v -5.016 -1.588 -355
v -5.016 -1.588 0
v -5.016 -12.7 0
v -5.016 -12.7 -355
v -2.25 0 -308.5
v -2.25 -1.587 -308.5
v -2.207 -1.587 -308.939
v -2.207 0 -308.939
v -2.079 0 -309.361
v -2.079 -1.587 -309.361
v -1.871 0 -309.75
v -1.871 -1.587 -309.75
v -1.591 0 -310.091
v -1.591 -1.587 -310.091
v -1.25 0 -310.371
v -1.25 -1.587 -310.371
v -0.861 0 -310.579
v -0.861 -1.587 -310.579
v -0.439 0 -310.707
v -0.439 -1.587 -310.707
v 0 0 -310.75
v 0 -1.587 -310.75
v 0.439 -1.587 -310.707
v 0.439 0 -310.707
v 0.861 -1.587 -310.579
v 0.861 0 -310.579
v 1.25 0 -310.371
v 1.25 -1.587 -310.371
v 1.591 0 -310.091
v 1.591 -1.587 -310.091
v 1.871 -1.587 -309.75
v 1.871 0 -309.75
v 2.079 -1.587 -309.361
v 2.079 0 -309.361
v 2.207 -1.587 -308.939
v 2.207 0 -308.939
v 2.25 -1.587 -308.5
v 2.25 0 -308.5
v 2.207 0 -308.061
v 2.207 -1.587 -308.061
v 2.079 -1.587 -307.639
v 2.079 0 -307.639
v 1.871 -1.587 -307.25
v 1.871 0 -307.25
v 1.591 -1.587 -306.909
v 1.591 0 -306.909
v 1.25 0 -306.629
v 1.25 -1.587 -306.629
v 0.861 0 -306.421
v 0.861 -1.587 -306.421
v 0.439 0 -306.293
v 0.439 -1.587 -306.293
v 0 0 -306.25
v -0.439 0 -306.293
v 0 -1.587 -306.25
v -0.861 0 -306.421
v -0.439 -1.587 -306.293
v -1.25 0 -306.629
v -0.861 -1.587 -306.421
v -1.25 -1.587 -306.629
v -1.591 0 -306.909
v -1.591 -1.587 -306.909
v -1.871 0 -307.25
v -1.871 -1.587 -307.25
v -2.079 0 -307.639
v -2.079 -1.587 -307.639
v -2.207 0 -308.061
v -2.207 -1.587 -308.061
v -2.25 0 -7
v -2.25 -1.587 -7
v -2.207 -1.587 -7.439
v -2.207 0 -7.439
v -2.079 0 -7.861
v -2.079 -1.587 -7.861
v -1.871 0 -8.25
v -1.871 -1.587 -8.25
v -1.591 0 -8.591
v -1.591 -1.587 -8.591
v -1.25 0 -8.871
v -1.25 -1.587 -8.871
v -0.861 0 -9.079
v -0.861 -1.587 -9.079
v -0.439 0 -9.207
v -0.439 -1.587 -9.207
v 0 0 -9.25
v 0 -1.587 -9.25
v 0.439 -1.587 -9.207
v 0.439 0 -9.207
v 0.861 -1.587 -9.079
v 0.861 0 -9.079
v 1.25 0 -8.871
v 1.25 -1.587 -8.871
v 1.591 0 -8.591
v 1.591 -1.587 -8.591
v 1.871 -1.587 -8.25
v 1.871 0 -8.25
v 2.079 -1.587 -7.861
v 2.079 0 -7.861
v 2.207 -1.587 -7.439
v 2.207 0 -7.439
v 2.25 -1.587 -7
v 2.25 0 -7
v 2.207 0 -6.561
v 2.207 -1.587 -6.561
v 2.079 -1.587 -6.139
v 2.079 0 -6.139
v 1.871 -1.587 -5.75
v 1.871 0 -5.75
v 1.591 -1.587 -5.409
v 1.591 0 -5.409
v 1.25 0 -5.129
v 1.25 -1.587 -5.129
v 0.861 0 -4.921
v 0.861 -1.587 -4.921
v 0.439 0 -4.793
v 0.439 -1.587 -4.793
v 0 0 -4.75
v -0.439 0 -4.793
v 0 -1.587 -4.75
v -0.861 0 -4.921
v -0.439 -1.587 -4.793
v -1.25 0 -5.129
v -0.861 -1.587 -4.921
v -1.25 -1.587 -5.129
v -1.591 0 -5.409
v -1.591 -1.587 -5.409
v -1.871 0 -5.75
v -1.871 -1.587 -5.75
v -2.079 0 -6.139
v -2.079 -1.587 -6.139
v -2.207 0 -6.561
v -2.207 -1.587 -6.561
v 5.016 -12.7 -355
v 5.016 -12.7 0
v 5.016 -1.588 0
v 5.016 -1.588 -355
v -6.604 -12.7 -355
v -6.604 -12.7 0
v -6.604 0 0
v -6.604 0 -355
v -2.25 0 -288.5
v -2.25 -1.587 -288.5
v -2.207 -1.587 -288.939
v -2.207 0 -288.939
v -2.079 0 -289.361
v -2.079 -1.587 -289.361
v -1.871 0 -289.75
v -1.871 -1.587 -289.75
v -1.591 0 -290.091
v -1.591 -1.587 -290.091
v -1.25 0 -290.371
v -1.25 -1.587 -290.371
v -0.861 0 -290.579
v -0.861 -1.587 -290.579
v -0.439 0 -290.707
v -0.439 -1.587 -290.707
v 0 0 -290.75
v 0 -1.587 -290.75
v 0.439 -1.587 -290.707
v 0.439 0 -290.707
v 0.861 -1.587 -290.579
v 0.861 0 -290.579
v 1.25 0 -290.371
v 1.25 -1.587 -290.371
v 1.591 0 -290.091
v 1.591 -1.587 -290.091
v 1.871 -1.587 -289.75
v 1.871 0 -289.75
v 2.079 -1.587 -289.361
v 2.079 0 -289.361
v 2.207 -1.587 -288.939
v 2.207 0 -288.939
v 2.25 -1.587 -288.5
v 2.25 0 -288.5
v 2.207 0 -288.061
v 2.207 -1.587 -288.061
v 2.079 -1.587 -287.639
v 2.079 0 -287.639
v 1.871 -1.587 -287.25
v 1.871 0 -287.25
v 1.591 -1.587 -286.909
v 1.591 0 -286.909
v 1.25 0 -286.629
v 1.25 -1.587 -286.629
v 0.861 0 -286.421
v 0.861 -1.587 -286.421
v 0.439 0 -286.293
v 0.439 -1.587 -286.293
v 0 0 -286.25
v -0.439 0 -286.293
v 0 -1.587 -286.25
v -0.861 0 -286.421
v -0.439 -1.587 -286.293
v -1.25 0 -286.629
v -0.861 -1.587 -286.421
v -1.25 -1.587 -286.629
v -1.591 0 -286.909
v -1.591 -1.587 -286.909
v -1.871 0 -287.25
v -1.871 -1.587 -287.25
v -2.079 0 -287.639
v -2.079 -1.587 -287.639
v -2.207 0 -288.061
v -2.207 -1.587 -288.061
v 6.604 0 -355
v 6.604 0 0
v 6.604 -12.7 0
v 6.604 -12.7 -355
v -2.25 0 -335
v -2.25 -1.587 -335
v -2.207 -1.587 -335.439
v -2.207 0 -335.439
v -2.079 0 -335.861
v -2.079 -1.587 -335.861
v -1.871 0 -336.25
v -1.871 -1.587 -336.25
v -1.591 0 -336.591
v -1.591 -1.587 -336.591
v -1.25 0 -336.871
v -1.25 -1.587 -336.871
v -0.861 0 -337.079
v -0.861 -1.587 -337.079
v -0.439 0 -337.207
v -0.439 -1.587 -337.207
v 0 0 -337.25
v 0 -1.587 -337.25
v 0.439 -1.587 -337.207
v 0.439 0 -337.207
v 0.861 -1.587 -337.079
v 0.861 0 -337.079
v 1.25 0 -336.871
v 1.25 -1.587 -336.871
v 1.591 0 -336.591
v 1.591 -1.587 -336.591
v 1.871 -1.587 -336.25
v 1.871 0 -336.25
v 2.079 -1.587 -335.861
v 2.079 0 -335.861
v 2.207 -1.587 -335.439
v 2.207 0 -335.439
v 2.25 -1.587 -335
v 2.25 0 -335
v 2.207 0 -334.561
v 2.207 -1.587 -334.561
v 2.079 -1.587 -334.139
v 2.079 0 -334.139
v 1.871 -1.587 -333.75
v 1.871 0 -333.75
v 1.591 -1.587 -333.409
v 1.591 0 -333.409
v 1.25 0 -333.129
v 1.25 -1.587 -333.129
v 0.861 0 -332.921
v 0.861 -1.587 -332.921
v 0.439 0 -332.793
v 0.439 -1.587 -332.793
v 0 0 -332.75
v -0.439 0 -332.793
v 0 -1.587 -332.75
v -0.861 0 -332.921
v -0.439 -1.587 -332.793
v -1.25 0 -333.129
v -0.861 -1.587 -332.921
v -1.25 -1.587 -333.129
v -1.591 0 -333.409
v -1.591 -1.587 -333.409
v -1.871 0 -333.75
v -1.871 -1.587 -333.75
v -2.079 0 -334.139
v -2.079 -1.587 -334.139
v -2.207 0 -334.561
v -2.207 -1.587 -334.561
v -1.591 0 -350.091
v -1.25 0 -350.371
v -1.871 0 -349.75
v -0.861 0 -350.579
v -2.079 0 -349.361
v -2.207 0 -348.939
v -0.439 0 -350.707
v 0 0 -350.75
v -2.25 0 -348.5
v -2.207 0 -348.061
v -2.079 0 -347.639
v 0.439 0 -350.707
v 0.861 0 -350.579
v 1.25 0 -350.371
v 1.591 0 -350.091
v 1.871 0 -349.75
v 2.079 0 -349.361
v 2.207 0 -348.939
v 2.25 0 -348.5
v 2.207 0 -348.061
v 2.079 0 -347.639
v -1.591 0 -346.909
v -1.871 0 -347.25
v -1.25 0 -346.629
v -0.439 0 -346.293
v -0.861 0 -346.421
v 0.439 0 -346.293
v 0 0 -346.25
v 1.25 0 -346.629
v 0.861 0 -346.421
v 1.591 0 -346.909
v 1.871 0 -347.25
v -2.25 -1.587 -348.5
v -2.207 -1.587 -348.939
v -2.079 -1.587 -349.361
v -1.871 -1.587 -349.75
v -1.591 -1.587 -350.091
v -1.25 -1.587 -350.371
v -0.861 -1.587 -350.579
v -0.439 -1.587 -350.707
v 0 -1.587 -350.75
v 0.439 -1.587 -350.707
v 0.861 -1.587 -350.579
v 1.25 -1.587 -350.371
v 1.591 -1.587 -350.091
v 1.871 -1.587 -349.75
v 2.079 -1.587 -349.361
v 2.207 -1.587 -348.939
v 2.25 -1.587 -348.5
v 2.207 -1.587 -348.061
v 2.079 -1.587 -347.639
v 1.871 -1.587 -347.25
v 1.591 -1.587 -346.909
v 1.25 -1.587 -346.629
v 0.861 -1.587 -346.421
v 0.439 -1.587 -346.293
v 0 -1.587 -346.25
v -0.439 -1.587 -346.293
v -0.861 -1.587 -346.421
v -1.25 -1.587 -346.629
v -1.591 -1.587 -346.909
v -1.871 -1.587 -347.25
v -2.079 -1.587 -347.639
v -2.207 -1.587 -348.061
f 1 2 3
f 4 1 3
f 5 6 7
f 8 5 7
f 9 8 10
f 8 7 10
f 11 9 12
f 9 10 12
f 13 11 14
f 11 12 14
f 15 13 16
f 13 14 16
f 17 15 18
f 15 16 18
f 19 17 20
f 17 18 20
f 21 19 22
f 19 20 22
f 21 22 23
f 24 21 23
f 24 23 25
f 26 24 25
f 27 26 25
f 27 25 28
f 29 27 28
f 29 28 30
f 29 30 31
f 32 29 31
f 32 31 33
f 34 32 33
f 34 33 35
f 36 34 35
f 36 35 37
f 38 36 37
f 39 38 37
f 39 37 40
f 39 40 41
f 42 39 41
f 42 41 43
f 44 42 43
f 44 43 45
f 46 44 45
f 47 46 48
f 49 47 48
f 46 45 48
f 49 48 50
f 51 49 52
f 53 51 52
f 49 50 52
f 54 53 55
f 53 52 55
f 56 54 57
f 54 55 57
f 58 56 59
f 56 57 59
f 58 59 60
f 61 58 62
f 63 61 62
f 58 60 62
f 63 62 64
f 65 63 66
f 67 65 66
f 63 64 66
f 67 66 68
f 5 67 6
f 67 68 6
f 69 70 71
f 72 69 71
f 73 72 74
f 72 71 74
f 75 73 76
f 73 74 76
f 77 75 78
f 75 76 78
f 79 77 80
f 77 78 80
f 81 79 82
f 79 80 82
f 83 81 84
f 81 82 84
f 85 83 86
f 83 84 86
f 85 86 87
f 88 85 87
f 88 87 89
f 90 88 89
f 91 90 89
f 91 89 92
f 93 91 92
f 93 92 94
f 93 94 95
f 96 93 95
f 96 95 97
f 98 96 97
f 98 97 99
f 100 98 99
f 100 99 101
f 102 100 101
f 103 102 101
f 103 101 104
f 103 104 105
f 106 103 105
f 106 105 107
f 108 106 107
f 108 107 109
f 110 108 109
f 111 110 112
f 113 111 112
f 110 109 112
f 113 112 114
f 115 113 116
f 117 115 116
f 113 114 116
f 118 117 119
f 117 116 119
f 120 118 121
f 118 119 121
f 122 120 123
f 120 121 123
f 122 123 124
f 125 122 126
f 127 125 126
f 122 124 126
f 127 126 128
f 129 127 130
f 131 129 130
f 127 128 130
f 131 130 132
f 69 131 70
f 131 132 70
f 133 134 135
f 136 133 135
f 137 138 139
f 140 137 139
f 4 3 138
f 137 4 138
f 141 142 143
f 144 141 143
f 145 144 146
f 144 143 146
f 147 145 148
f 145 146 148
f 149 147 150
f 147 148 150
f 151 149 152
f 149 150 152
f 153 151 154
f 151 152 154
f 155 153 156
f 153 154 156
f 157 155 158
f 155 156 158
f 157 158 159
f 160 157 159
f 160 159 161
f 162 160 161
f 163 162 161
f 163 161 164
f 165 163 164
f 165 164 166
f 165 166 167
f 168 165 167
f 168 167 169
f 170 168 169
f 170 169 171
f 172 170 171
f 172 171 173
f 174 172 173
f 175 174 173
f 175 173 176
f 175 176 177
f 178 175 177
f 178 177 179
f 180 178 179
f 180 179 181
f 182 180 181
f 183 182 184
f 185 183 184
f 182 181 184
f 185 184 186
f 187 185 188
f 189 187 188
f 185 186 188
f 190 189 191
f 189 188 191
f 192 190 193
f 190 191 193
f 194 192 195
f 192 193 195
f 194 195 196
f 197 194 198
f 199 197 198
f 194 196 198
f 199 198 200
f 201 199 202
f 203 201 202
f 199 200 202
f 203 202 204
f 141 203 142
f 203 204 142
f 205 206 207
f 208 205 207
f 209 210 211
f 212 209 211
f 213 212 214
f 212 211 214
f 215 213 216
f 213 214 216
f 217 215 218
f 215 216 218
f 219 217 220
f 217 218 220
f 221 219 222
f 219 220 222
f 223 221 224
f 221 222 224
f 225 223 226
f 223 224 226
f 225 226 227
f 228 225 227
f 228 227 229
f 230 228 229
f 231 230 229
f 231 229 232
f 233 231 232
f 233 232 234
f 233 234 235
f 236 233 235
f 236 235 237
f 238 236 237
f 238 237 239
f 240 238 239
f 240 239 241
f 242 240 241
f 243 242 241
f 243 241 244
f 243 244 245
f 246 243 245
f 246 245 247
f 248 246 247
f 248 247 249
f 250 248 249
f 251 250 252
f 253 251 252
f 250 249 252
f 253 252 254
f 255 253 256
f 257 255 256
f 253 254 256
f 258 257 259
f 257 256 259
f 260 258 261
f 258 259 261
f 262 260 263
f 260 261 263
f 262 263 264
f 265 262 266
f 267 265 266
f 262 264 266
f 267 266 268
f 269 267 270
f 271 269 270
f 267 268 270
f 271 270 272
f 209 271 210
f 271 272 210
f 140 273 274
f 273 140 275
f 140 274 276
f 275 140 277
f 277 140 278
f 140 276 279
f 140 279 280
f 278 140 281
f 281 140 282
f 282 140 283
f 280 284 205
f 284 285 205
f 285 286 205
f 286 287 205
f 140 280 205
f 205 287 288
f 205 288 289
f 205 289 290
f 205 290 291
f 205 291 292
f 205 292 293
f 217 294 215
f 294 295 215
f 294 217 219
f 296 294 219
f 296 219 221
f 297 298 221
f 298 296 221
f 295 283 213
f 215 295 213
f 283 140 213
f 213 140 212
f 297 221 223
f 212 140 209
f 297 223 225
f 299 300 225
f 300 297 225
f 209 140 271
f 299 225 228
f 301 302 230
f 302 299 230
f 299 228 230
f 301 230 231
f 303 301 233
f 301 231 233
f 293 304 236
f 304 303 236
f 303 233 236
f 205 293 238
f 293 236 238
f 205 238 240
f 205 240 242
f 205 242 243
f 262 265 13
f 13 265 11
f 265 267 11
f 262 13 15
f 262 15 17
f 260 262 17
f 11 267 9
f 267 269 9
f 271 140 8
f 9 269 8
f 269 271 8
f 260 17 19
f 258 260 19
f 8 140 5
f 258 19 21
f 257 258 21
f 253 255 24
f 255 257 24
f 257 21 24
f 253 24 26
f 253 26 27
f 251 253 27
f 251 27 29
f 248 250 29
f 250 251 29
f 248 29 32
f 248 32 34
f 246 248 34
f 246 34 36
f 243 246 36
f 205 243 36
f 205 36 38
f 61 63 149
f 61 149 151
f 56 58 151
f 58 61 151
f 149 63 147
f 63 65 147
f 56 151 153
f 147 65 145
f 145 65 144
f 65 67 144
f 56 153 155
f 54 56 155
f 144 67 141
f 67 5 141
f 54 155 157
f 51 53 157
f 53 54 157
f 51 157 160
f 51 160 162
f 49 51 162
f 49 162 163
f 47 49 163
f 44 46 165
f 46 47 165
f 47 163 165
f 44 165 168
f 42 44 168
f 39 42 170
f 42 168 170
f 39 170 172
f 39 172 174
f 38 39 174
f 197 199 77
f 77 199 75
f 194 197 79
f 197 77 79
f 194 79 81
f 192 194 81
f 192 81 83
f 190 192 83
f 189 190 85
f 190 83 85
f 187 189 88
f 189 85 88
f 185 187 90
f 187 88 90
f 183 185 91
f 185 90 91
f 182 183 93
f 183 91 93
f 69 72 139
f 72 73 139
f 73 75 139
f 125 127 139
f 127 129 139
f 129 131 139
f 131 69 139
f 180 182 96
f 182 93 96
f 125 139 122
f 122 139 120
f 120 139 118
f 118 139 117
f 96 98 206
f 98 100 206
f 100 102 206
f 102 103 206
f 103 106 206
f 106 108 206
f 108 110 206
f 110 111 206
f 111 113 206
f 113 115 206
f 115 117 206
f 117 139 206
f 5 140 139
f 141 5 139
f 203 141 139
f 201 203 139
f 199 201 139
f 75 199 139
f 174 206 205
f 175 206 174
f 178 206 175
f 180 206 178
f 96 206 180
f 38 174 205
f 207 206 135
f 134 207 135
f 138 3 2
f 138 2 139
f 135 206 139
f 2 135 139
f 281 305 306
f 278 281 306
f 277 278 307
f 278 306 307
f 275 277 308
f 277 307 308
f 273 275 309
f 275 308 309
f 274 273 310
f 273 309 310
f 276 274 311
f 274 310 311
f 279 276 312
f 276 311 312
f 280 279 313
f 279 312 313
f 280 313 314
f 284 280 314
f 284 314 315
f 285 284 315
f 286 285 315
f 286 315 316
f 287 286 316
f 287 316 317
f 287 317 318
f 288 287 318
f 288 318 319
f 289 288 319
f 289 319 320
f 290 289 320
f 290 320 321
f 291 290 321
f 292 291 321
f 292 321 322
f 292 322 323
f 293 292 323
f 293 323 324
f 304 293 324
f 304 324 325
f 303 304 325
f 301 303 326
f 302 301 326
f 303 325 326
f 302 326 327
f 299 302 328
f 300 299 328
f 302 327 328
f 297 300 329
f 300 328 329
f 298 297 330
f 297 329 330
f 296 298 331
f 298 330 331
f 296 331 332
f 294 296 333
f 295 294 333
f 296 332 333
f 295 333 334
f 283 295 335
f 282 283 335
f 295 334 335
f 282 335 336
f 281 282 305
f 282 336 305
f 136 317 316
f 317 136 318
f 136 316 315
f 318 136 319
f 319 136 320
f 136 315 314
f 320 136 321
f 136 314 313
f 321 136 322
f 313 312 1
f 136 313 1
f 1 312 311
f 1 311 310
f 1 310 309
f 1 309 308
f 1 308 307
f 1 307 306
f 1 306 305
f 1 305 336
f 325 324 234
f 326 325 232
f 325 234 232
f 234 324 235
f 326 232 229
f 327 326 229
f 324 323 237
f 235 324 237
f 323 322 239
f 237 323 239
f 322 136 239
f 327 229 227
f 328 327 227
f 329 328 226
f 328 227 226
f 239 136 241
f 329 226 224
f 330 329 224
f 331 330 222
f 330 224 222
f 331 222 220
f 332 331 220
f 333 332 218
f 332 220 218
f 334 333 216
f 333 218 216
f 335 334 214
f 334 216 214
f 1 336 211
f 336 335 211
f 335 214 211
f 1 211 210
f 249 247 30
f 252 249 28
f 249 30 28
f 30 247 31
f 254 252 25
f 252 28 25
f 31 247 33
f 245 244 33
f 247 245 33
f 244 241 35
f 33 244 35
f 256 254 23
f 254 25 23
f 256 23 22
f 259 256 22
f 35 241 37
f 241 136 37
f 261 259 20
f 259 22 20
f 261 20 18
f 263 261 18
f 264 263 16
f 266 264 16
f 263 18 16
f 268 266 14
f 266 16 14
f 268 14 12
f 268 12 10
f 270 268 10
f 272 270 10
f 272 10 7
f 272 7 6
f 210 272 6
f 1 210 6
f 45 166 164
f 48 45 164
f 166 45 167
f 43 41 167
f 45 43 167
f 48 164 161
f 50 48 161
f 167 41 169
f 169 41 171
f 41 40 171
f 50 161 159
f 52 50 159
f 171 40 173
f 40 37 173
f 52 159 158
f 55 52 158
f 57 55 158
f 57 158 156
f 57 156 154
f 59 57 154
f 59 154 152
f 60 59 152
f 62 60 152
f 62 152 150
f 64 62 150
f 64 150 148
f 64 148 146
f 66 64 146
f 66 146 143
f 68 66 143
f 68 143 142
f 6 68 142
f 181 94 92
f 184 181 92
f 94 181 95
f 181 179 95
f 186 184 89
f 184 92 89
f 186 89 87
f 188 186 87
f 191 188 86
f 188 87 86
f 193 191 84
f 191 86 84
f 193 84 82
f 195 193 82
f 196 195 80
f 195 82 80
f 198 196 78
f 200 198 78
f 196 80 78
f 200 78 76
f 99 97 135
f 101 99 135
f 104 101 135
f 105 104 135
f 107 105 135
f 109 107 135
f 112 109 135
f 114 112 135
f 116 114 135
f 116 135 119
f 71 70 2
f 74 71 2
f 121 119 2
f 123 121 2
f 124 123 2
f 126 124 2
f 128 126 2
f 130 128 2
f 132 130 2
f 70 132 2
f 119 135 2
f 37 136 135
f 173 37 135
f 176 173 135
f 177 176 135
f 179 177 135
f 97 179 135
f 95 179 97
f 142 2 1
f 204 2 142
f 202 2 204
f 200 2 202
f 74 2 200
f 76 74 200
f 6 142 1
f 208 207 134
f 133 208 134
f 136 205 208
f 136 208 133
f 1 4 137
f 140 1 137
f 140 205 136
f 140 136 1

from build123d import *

# Parameters (mm, degrees)
BOSS_EXTRUDE1_DEPTH  = 355
M4_CLEARANCE_HOLE2_D = 4.5


with BuildPart() as part:
    # Sketch1 → Boss-Extrude1 (new body)
    with BuildSketch(Plane.XY):
        Polygon((-6.604, 0), (6.604, 0), (6.604, -12.7), (5.0165, -12.7), (5.0165, -1.5875), (-5.0165, -1.5875), (-5.0165, -12.7), (-6.604, -12.7), align=None)
    extrude(amount=-BOSS_EXTRUDE1_DEPTH)

    # M4 Clearance Hole2 (through all)
    with Locations(Plane(origin=(0, 0, 0), x_dir=(1, 0, 0), z_dir=(0, 1, 0))):
        with Locations((0, 288.5), (0, 7), (0, 348.5), (0, 308.5), (0, 335)):
            Hole(M4_CLEARANCE_HOLE2_D / 2)


solid = part.part
